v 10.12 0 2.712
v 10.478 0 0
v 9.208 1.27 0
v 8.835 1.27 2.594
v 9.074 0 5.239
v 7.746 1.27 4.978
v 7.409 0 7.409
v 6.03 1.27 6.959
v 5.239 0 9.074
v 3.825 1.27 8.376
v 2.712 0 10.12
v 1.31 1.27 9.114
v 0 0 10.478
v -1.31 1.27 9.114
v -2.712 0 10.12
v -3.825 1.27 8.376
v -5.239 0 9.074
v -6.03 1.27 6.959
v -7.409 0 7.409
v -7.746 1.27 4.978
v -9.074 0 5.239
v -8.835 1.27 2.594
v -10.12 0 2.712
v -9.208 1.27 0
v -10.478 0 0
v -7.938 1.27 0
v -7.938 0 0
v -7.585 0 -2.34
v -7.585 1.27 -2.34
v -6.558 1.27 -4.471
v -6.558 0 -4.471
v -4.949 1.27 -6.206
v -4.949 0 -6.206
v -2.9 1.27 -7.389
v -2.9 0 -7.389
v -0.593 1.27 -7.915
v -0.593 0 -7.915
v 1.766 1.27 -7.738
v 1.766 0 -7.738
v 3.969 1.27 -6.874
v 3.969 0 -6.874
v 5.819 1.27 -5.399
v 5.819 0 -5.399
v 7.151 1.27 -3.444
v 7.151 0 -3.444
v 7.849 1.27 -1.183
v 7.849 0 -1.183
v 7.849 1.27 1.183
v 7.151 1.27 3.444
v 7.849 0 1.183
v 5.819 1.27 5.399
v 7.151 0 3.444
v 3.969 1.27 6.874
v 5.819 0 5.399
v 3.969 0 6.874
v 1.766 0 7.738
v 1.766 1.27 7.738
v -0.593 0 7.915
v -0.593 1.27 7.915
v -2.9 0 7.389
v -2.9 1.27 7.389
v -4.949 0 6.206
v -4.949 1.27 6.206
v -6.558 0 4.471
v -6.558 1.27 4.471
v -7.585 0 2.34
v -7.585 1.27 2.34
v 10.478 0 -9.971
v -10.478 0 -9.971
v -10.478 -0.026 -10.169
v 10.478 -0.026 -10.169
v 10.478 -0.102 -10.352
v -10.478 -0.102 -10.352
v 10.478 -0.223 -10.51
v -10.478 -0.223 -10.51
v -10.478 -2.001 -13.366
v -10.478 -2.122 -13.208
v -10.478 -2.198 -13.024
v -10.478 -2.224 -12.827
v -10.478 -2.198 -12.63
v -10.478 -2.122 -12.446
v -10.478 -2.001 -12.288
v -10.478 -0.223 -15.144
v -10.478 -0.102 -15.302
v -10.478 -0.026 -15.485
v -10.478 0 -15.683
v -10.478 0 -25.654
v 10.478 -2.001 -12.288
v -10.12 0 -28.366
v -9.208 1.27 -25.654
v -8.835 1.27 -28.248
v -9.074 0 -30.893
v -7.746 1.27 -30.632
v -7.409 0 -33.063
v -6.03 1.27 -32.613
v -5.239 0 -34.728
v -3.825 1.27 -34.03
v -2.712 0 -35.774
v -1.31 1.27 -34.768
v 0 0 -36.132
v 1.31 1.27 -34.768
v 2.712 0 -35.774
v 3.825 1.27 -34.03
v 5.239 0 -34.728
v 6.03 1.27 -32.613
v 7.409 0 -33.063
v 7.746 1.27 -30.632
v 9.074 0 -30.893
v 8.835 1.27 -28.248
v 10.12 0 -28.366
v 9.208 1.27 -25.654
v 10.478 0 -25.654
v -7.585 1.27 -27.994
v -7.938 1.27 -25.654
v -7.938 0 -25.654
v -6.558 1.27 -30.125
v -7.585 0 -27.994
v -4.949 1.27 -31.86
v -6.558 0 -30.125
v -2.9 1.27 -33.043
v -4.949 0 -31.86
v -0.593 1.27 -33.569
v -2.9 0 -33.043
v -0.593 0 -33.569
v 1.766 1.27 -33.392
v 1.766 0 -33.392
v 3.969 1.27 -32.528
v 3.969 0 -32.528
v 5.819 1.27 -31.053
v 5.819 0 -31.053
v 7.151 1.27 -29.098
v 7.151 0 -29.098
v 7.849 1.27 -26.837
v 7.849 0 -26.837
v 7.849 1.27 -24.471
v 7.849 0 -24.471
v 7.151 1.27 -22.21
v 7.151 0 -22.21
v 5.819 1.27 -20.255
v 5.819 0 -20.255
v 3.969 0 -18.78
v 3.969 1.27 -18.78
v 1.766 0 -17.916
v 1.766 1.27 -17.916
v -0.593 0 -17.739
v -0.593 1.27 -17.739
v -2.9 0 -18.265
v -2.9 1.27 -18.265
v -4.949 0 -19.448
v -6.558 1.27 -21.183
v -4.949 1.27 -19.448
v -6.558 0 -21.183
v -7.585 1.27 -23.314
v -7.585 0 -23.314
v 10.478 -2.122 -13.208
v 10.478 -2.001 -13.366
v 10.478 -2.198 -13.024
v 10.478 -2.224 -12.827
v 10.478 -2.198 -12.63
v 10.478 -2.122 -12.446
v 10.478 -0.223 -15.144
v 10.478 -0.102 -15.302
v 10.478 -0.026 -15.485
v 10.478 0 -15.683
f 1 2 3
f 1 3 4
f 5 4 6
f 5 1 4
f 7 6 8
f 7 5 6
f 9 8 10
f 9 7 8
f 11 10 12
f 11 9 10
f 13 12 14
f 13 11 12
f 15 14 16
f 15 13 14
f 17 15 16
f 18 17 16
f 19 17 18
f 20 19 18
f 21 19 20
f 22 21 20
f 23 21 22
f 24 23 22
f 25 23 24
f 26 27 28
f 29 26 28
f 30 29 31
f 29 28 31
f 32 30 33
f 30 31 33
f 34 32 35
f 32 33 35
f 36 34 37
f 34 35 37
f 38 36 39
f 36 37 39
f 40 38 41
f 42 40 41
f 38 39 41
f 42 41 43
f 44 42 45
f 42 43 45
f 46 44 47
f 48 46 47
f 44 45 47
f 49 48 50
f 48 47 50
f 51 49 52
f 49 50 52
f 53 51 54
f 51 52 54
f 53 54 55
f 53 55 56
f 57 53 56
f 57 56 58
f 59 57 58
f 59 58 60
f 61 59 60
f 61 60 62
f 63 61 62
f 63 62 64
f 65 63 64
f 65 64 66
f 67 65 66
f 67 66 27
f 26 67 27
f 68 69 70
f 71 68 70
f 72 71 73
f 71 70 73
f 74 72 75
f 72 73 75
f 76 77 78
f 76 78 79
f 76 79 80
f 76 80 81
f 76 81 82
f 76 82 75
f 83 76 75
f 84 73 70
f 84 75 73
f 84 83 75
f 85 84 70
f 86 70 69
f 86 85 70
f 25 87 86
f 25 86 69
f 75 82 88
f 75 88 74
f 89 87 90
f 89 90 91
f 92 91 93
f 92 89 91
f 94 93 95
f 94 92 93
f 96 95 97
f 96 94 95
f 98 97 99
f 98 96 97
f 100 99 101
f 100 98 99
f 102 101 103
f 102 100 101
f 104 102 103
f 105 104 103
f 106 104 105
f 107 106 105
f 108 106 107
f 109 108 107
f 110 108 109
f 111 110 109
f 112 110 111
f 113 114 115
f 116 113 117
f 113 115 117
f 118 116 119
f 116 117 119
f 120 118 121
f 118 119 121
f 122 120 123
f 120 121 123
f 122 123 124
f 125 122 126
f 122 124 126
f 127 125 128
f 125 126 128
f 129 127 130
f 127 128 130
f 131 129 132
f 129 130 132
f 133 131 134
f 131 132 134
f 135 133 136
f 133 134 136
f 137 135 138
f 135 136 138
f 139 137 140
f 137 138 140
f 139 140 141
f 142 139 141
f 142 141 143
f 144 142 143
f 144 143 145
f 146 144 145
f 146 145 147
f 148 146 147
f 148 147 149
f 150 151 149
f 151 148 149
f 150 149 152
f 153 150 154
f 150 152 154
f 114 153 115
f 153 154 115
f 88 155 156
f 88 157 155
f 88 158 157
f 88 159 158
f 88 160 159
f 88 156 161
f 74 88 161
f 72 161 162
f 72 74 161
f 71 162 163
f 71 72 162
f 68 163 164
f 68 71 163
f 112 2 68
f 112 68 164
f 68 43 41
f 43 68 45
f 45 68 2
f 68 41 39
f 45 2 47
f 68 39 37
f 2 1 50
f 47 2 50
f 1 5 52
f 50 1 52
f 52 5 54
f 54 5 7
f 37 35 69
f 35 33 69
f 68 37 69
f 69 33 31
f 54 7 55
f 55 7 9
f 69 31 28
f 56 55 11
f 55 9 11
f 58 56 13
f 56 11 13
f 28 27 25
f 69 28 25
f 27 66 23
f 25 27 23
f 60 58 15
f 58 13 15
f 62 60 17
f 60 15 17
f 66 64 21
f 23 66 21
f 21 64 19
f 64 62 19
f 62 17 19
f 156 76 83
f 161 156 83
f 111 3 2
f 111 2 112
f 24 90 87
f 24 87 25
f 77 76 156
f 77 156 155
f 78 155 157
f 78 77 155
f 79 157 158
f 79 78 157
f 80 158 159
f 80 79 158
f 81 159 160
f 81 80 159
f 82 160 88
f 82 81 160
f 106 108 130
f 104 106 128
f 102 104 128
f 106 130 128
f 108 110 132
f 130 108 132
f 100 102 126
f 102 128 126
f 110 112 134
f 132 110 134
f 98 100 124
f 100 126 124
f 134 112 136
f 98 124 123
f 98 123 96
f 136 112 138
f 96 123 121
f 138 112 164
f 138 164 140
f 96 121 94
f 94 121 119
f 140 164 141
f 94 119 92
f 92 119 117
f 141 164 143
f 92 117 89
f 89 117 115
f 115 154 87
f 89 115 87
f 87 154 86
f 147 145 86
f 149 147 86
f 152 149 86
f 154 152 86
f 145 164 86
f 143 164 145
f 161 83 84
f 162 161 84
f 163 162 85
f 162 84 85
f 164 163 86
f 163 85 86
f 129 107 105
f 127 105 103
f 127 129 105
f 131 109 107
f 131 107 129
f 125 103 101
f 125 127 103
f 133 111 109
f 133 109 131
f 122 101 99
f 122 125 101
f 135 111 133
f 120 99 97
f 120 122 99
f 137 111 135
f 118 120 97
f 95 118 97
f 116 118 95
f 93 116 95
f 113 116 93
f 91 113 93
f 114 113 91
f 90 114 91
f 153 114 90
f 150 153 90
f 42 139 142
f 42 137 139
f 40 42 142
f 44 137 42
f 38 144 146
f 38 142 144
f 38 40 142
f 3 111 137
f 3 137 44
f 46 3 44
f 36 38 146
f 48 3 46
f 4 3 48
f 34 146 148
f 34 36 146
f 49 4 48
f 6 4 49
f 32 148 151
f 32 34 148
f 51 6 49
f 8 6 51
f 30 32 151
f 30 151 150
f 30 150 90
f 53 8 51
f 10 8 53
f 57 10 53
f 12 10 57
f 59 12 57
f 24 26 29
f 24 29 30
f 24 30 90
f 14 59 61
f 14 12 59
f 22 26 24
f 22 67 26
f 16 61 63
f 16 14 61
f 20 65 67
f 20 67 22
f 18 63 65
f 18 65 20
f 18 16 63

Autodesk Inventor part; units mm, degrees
ref_plane "YZ Plane" through (0, 0, 0) normal (1, 0, 0) x (0, 1, 0)
ref_plane "XZ Plane" through (0, 0, 0) normal (0, 1, 0) x (-1, 0, 0)
ref_plane "XY Plane" through (0, 0, 0) normal (0, 0, 1) x (1, 0, 0)
sketch "Sketch1" plane through (0, 0, 0) normal (0, 1, 0) x (-1, 0, 0)
  circle A0 centre (0, 0) radius 7.9375
  line L0 (0, -7.9375) -> (0, -17.7165)
  line L1 (0, -17.7165) -> (0, -33.5915)
  circle A1 centre (0, -25.654) radius 7.9375
  line L2 (0, 0) -> (0, -25.654) construction
  line L3 (-7.9375, 0) -> (-7.9375, -25.654)
  line L4 (7.9375, -25.654) -> (7.9375, 0)
  arc A2 (7.9375, 0) -> (-7.9375, 0) centre (0, 0) ccw
  arc A3 (-7.9375, -25.654) -> (7.9375, -25.654) centre (0, -25.654) ccw
  line L5 (10.4775, 0) -> (10.4775, -25.654)
  arc A4 (-10.4775, -25.654) -> (10.4775, -25.654) centre (0, -25.654) ccw
  line L6 (-10.4775, -25.654) -> (-10.4775, 0)
  arc A5 (10.4775, 0) -> (-10.4775, 0) centre (0, 0) ccw
  point P0 (0, -12.827)
  dimension "d0" = 15.875
  dimension "d1" = 9.779
  dimension "d2" = 15.875
  dimension "d3" = 2.54
extrude "Extrusion1" add sketch "Sketch1" along normal blind 1.27 contours L4 A1 L0 A0 | A0 L0 A1 L3 | L5 A4 L6 A5
sketch "Sketch2" plane through (10.4775, 0, 0) normal (1, 0, 0) x (0, 0, -1)
  line L0 (25.654, 0) -> (0, 0) projected
  line L1 (12.827, 0) -> (12.827, -2.54)
  line L2 (12.827, -2.54) -> (10.287, 0)
  line L3 (12.827, -2.54) -> (15.367, 0)
  dimension "d6" = 2.54
  dimension "d7" = 45
extrude "Extrusion2" add sketch "Sketch2" against normal up to surface (20.955 mm away)
fillet "Fillet1" radius 0.762 3 edges at (0, 0, -15.367) (0, -2.54, -12.827) (0, 0, -10.287)
chamfer "Chamfer1" distance 1.27 angle 45 4 edges at (10.4775, 1.27, -12.827) (0, 1.27, -36.1315) (-10.4775, 1.27, -12.827) (0, 1.27, 10.4775)
properties part number "Ultrasonic Sensor Cover_3DPrint"
